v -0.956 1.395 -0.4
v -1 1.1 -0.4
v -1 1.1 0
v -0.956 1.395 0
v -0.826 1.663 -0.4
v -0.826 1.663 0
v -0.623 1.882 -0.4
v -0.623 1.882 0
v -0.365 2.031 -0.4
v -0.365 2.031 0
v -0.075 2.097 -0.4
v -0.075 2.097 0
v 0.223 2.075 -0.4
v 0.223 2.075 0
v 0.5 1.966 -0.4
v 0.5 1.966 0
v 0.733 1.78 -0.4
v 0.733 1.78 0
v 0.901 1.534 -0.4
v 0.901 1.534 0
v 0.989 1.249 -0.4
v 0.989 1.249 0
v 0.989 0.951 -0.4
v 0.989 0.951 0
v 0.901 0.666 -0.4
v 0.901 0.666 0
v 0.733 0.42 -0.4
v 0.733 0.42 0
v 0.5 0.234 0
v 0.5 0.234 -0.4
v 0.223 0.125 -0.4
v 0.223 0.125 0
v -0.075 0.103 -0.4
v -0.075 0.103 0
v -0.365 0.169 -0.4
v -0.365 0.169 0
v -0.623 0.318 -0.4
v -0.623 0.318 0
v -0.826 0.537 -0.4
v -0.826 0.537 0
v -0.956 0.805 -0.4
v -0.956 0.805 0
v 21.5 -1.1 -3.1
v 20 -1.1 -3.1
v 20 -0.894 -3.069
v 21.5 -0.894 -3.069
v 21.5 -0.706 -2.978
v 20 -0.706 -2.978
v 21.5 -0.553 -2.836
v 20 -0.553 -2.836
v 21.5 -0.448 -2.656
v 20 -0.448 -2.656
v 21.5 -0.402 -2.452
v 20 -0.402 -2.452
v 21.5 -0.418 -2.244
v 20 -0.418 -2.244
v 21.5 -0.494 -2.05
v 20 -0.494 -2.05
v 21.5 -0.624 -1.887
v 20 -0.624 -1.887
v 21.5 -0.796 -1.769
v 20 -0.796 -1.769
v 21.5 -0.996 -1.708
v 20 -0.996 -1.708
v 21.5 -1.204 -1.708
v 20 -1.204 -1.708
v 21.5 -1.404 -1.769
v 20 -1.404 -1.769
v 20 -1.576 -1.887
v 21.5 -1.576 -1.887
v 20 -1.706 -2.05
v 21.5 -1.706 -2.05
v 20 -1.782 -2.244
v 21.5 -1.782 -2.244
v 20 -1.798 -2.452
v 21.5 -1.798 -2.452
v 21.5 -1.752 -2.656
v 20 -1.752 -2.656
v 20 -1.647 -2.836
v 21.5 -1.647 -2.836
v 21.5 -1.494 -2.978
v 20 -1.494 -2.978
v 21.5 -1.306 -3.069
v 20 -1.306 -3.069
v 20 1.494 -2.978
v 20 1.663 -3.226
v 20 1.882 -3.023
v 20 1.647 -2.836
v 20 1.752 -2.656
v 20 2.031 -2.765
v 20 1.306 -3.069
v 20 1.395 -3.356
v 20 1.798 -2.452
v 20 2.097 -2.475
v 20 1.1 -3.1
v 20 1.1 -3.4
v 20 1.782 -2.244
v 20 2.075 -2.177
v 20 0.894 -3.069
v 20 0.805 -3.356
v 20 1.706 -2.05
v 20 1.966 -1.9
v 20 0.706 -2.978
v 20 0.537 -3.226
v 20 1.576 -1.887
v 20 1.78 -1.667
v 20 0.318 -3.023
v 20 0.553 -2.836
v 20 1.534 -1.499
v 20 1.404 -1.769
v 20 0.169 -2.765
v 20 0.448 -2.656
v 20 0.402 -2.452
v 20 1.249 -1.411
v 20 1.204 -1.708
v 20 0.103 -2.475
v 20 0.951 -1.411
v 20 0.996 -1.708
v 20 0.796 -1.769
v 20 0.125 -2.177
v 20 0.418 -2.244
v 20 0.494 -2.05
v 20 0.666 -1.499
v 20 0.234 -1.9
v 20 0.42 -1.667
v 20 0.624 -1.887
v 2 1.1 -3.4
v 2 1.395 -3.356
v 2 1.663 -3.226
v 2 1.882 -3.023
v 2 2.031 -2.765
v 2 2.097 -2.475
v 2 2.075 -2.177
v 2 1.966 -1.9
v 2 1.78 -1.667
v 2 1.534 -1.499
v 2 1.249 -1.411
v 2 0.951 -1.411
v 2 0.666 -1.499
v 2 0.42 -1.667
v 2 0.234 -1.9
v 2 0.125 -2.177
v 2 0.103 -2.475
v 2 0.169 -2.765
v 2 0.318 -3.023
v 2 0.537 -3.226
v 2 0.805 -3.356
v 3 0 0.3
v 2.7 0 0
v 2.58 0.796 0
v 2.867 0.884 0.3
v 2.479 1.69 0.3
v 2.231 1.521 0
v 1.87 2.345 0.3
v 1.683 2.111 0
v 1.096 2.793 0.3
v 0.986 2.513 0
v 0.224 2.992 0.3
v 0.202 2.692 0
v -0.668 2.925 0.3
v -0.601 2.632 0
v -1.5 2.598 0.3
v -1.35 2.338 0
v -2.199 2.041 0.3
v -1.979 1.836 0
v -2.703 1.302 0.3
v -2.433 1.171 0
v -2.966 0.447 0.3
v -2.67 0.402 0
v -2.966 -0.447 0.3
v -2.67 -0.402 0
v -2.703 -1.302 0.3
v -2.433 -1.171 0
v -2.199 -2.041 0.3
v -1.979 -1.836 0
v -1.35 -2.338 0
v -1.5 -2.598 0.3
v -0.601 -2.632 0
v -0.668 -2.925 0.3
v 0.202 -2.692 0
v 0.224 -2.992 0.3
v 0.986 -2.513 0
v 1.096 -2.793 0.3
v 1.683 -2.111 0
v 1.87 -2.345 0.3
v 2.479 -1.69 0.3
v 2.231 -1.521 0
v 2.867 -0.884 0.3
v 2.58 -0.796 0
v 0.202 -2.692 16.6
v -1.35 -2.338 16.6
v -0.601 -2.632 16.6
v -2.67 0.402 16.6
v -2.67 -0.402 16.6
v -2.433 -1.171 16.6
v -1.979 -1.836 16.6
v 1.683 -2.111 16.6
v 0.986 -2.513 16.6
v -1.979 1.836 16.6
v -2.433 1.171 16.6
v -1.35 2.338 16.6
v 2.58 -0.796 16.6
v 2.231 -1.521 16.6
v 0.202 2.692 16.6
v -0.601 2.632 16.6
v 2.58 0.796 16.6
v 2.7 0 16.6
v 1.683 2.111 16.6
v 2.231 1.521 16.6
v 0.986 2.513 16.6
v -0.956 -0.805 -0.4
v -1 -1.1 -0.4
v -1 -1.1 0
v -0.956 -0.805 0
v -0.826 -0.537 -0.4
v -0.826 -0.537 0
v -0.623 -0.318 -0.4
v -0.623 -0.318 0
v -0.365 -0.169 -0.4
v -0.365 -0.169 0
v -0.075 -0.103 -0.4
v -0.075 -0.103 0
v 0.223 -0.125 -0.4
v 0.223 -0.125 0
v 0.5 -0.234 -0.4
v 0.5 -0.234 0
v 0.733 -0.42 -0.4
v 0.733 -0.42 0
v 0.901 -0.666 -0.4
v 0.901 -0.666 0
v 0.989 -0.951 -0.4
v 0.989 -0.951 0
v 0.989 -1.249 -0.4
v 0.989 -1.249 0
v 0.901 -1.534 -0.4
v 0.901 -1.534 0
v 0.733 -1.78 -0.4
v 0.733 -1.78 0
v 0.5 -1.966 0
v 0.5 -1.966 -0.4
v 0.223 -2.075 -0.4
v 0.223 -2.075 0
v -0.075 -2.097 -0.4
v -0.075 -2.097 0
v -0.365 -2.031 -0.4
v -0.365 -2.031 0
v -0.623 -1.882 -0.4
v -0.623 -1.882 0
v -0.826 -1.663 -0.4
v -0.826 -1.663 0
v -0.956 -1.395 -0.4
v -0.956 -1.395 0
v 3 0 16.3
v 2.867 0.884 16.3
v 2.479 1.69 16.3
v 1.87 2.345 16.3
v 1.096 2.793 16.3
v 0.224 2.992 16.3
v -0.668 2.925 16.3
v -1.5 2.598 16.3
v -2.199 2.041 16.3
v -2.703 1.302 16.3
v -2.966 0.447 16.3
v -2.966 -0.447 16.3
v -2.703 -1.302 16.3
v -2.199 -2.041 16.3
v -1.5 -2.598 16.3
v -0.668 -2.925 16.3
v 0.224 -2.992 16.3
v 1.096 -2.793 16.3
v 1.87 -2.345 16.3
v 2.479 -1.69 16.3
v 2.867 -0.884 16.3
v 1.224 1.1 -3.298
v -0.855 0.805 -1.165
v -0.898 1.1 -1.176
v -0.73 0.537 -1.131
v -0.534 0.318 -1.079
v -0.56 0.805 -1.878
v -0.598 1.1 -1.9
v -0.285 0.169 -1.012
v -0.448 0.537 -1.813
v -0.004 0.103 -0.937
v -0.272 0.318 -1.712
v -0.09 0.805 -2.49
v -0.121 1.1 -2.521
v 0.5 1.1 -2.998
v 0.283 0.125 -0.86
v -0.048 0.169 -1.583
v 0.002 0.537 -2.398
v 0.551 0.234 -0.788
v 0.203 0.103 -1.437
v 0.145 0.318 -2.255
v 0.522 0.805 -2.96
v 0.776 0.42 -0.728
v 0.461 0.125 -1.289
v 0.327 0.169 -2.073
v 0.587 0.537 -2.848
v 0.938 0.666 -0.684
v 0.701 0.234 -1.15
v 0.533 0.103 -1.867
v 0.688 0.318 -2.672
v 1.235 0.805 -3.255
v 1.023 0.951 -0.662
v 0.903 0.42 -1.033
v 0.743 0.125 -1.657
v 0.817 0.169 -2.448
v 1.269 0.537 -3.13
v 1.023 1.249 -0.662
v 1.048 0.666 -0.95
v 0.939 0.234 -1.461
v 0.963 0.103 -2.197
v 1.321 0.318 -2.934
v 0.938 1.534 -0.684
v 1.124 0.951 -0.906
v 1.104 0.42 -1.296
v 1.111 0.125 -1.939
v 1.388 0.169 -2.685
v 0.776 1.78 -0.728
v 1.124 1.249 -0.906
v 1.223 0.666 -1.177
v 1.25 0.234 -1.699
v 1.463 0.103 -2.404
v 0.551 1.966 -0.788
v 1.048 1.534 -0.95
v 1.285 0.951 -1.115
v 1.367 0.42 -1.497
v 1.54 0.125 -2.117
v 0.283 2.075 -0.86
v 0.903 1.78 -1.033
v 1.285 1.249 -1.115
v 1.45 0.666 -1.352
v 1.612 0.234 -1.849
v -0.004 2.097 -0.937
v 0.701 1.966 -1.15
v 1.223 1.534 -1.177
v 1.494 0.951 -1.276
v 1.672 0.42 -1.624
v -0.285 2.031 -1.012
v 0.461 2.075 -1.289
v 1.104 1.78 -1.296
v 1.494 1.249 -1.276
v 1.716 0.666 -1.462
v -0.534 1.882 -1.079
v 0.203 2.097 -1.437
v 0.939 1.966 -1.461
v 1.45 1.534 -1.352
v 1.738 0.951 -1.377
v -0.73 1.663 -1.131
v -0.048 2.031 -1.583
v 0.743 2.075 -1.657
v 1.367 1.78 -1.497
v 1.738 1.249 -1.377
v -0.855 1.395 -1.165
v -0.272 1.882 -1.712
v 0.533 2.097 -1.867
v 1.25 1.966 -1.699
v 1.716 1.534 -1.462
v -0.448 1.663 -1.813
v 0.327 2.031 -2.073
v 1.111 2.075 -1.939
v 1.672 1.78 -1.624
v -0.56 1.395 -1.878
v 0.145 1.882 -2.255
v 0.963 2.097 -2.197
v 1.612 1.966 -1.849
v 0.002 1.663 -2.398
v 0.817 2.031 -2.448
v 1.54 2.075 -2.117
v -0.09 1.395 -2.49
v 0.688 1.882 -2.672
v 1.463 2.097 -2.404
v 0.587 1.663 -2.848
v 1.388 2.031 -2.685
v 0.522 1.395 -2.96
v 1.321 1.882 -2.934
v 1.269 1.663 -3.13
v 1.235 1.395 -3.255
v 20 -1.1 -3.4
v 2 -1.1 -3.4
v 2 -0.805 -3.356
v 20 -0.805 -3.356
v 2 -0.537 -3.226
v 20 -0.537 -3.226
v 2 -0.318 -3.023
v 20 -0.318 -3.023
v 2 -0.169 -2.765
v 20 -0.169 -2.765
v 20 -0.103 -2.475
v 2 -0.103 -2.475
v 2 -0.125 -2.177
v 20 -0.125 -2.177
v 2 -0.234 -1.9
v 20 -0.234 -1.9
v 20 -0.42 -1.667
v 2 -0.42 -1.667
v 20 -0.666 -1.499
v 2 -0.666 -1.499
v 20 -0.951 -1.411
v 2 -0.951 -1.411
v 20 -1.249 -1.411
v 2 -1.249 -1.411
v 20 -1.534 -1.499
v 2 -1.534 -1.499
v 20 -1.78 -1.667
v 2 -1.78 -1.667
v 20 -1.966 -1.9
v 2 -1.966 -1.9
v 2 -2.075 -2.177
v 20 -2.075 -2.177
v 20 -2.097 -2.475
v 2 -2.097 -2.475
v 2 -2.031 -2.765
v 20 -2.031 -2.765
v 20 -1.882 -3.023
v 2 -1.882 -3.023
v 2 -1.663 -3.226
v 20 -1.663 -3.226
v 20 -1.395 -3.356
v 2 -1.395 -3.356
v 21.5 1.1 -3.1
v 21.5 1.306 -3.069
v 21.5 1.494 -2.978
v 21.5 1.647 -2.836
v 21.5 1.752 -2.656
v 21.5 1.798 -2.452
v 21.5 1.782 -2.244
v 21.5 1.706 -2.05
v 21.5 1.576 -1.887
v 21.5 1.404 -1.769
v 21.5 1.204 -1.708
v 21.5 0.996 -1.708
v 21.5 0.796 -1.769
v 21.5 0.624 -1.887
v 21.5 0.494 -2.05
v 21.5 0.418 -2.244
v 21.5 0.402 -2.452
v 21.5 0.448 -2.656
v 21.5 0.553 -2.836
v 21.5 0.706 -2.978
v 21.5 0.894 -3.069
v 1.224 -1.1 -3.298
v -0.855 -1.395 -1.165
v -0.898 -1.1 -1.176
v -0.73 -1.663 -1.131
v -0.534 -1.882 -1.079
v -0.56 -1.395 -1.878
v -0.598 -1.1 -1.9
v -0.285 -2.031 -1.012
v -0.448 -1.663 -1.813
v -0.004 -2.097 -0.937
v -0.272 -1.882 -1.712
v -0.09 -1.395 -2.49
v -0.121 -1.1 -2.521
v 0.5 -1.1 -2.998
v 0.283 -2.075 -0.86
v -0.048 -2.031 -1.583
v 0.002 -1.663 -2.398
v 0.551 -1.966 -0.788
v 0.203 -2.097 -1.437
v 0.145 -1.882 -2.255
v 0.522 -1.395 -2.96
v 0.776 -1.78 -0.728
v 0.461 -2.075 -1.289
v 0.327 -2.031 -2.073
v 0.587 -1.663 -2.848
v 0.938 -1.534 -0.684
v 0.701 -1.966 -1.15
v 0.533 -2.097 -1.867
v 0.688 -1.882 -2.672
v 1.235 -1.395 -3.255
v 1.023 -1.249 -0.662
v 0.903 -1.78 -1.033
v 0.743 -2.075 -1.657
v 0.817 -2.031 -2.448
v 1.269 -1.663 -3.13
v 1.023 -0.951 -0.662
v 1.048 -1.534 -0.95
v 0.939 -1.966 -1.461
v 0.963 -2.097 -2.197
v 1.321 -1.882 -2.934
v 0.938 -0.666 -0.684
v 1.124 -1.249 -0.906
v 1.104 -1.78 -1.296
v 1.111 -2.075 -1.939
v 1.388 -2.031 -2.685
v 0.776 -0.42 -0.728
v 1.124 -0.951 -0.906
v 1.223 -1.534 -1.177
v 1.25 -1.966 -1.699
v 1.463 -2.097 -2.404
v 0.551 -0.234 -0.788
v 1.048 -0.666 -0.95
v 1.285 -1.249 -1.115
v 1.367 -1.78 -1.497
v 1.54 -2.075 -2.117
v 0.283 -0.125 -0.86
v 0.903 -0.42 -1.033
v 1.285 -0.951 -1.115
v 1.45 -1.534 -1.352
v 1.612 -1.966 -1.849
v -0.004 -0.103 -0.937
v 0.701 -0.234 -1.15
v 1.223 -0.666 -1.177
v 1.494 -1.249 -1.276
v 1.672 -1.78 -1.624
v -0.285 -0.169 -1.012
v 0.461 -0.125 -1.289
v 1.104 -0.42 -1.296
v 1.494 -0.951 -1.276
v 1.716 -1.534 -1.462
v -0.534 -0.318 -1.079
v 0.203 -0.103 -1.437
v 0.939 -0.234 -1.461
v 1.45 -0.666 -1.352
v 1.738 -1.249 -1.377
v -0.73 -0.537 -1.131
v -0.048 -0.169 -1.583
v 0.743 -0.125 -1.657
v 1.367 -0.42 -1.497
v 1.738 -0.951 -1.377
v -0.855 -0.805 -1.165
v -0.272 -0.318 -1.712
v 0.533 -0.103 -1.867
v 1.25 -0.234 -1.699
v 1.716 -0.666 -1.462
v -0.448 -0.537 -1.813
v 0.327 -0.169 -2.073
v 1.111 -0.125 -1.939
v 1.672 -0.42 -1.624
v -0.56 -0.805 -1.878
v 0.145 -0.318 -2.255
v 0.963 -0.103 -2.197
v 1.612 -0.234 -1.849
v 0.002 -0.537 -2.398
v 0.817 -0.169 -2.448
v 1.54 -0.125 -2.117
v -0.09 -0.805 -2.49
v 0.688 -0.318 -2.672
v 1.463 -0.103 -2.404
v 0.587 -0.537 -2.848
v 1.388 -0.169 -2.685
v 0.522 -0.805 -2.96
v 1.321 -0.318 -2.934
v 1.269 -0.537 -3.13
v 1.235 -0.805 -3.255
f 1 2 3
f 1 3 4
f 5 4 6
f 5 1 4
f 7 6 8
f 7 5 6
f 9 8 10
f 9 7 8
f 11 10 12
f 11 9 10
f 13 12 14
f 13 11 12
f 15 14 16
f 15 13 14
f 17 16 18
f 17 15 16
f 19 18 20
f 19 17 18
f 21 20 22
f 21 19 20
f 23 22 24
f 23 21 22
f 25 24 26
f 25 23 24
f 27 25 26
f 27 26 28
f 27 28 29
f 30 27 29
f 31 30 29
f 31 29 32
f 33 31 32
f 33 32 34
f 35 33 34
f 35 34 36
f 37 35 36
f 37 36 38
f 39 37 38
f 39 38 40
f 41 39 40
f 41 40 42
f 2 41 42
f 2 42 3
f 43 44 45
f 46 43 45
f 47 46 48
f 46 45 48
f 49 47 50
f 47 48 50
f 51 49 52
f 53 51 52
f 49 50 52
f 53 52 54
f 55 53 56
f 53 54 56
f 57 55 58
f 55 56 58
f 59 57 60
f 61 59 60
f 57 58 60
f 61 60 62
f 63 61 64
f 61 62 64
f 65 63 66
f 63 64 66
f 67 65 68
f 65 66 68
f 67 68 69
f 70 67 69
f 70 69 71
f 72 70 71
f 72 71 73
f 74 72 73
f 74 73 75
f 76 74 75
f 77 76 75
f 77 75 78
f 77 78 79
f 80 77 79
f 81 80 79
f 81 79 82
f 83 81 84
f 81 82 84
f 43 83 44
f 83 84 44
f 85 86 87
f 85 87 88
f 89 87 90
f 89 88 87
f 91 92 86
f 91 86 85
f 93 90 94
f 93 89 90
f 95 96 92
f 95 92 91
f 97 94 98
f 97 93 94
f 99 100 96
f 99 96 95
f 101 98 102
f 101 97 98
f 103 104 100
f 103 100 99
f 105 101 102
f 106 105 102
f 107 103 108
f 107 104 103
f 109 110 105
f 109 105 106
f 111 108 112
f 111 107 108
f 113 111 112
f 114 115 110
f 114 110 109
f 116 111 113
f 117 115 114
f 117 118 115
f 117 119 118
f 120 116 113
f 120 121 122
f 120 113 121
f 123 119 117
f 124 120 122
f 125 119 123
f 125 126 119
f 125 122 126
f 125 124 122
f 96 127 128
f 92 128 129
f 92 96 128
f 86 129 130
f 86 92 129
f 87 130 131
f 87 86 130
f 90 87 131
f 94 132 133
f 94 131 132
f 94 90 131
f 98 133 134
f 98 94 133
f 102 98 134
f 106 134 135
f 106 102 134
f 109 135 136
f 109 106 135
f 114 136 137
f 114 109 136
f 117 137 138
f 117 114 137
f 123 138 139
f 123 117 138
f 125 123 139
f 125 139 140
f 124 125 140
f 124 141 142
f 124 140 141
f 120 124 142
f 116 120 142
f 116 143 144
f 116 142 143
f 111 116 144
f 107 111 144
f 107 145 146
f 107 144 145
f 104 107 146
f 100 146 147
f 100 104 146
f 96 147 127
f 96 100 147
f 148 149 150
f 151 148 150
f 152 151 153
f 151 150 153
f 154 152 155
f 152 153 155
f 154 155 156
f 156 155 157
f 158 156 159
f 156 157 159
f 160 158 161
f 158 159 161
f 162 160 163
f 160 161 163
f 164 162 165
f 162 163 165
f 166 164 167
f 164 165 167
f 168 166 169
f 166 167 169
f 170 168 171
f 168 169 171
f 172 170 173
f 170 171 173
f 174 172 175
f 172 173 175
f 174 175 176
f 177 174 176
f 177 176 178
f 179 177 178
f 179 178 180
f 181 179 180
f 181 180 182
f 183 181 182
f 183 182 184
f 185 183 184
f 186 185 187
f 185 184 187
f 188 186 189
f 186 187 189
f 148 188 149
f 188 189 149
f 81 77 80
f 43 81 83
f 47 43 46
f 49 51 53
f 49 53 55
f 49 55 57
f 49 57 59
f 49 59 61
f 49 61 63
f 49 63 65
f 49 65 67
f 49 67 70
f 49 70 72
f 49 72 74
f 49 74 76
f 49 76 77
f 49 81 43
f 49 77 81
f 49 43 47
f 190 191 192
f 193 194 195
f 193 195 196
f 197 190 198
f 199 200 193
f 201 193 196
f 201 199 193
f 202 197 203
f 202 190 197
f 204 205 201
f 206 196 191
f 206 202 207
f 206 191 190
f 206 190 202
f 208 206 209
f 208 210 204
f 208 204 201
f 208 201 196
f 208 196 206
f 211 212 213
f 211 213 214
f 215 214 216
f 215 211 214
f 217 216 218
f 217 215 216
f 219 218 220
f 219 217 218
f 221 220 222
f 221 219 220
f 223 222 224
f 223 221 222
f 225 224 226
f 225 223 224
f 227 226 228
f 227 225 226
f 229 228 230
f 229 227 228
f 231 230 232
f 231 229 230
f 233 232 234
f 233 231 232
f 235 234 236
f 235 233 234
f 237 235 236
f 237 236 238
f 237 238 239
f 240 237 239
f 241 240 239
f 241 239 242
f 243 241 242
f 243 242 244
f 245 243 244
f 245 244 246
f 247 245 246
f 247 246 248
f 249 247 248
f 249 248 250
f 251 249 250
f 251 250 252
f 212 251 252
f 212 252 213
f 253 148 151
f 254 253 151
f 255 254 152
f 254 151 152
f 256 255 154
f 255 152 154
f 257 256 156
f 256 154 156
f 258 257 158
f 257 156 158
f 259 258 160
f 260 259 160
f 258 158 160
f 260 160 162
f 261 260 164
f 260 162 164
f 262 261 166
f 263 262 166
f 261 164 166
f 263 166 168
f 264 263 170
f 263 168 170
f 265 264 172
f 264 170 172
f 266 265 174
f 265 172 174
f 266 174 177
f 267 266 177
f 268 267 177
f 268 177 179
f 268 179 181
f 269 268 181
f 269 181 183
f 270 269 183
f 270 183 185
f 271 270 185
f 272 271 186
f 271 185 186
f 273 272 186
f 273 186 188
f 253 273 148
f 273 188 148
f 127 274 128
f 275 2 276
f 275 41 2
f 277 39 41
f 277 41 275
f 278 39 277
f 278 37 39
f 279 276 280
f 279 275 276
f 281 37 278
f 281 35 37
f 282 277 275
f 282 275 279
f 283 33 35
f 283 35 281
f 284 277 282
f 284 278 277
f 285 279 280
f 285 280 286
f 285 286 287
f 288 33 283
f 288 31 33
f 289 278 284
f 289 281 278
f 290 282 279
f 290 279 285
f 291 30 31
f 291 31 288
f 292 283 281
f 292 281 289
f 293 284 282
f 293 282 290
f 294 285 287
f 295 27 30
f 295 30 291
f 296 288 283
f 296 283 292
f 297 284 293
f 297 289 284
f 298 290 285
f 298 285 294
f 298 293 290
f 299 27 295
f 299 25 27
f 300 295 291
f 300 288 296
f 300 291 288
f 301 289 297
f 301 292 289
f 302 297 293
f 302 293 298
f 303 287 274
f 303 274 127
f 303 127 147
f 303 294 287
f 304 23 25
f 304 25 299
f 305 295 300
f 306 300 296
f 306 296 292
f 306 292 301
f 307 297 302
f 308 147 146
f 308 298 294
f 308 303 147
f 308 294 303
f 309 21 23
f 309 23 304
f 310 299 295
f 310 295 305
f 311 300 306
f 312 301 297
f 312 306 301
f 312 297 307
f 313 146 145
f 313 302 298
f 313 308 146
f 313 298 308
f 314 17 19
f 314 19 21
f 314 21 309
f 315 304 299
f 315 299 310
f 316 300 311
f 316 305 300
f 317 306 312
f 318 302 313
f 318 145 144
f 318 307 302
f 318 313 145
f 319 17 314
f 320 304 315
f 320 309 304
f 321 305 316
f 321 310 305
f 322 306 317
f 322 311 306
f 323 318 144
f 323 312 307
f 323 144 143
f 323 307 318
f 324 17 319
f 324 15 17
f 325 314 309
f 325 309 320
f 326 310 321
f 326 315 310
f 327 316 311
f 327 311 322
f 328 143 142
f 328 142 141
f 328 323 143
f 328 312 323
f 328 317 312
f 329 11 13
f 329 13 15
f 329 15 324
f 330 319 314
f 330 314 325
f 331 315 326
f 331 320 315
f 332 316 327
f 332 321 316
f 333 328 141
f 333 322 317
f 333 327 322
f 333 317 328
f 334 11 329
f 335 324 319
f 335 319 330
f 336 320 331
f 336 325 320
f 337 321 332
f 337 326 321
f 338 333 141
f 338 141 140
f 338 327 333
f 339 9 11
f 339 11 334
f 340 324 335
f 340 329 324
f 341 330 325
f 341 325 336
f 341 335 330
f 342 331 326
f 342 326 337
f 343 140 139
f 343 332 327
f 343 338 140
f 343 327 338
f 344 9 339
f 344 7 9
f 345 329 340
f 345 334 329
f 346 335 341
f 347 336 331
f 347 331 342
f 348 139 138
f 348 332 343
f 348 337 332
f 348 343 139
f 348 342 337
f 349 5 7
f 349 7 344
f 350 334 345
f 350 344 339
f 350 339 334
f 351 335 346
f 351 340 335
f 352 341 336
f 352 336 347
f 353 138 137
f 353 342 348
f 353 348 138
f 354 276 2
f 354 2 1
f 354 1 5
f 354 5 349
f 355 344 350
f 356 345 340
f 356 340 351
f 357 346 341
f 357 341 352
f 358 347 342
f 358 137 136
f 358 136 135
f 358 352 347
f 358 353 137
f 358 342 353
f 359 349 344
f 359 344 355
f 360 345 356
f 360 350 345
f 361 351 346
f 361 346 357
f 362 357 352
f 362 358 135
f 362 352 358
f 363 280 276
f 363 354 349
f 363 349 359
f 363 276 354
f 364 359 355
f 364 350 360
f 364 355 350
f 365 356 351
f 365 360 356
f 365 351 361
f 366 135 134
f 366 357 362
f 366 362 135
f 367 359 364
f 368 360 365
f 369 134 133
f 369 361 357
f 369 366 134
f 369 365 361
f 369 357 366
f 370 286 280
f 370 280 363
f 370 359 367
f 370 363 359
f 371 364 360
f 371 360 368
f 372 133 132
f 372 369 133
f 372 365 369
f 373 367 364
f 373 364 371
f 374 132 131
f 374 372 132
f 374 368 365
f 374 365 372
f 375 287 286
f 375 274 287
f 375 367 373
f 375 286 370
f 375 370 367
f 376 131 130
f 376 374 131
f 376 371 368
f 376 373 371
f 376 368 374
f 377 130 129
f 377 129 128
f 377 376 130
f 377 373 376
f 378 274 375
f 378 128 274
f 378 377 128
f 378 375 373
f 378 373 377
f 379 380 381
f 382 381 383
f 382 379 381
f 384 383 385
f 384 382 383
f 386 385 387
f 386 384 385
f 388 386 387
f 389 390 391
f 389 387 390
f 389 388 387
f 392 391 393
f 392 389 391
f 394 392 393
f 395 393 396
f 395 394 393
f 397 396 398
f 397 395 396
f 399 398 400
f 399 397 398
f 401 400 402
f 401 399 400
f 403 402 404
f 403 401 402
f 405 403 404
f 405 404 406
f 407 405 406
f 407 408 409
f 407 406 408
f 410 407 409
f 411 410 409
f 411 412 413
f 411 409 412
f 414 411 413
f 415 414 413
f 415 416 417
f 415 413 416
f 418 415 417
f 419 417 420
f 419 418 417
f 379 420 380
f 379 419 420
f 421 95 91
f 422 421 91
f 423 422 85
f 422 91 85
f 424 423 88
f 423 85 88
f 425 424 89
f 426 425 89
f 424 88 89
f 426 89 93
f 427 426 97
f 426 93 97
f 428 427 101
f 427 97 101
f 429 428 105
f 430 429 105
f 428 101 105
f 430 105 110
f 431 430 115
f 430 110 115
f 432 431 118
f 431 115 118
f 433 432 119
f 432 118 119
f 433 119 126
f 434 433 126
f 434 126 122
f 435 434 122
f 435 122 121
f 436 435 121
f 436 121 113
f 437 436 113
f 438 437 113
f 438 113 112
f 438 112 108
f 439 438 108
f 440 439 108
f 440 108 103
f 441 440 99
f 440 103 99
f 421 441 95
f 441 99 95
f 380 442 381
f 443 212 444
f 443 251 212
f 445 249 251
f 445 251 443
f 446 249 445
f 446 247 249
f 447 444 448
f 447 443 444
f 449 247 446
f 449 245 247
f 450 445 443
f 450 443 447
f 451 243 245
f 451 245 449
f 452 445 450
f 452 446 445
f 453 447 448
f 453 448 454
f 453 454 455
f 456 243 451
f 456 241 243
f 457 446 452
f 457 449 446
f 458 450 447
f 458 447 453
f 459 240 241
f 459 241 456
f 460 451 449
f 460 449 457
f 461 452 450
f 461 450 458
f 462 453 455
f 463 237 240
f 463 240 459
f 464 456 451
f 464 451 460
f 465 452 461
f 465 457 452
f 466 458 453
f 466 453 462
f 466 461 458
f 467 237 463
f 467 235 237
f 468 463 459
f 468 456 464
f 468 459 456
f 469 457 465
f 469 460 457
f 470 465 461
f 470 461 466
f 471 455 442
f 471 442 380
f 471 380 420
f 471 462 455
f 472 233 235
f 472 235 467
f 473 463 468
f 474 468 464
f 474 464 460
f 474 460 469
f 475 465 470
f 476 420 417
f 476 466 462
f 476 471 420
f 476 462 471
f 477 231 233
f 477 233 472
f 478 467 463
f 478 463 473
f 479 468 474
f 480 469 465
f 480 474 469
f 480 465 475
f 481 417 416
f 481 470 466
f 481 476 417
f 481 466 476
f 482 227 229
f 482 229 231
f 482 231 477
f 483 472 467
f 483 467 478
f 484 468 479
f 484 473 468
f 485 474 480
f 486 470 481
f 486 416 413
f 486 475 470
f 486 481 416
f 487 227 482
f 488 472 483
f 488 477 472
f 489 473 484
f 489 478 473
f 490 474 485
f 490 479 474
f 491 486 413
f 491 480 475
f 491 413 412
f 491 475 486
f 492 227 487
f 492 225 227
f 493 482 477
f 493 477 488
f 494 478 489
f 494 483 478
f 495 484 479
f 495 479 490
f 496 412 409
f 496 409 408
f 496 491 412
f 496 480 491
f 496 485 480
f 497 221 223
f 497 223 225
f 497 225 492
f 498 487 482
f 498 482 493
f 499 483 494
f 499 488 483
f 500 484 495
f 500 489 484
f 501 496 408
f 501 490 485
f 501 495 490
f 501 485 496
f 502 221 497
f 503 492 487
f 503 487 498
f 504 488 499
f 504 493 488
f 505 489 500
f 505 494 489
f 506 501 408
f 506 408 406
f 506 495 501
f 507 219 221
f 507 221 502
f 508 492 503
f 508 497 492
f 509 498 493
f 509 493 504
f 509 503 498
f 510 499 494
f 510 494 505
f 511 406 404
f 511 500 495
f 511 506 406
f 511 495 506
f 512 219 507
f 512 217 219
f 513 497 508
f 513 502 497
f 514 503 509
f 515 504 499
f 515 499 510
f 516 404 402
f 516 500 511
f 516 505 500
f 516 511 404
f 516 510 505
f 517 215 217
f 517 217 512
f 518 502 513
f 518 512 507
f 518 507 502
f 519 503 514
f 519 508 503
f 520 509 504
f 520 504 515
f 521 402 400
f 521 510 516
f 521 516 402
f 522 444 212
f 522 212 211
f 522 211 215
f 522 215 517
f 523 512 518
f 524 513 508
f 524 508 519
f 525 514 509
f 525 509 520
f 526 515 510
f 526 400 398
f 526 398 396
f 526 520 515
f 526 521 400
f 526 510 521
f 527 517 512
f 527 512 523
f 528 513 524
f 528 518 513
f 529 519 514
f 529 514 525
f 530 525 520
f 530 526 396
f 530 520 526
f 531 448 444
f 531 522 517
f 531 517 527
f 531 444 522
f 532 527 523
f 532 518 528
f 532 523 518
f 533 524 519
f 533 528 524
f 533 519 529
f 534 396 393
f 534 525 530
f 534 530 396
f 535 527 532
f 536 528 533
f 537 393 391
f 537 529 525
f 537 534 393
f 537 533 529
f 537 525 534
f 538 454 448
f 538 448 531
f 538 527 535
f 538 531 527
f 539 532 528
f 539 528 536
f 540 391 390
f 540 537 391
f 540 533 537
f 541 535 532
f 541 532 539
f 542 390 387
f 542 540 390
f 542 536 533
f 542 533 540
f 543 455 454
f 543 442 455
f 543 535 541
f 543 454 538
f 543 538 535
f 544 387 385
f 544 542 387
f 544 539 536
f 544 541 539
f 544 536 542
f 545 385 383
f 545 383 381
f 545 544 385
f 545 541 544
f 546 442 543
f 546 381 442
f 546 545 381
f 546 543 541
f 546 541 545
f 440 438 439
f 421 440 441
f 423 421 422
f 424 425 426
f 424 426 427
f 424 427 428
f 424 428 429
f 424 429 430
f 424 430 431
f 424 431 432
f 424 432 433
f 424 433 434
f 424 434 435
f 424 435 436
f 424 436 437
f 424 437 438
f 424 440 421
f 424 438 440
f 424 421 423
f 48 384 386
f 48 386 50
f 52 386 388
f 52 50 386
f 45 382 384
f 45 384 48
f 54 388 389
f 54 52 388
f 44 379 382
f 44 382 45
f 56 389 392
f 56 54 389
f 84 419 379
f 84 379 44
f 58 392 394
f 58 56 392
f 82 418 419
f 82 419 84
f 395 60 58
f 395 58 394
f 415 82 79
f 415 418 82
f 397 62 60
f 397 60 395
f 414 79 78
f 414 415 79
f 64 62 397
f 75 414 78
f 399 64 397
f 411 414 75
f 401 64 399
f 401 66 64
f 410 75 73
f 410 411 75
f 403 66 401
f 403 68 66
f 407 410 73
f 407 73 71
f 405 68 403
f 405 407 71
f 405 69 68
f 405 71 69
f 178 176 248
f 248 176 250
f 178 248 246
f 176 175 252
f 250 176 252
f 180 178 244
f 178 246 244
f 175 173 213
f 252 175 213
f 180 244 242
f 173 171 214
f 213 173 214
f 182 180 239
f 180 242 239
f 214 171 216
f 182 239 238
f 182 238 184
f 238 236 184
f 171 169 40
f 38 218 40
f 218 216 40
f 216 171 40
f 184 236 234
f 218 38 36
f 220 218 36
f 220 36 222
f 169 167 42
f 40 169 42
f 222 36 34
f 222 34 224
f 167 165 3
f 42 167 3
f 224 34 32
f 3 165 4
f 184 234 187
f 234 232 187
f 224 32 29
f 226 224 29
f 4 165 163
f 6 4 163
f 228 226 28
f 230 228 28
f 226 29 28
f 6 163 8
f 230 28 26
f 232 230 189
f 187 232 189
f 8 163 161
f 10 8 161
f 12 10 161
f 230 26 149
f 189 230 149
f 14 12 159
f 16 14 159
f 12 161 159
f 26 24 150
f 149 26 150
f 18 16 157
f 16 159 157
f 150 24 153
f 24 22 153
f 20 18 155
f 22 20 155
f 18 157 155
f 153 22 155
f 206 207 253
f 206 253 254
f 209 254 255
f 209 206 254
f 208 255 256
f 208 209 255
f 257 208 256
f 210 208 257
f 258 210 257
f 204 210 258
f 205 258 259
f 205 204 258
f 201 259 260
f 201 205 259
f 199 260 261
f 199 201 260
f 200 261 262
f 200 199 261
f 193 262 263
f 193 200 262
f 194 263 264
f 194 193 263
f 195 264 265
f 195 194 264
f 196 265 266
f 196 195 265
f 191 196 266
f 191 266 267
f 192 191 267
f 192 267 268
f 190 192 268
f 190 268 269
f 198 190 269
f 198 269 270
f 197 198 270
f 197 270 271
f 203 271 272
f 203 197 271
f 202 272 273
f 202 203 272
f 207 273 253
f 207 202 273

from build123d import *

# Parameters (mm, degrees)
SKETCH1_R           = 3
CASING_DEPTH        = 16.6
CASING_CHAMFER_SIZE = 0.3
SKETCH3_R           = 1
SKETCH4_R           = 0.7
EXPOSED_WIRE_DEPTH  = 1.5


with BuildPart() as part:
    # Sketch1 → Casing (new body)
    with BuildSketch(Plane.XY):
        Circle(SKETCH1_R)
    extrude(amount=CASING_DEPTH)

    # Casing Chamfer
    casing_chamfer_edges = [part.edges().sort_by_distance(p)[0] for p in [
        (-3, 0, 0),
        (-3, 0, 16.6),
    ]]
    chamfer(casing_chamfer_edges, length=CASING_CHAMFER_SIZE)

    # Wire 2: sweep along a path in Sketch2
    with BuildLine(Plane(origin=(0, 0, 0), x_dir=(1, 0, 0), z_dir=(0, 1, 0))) as wire_2_path:
        Line((0, 0), (0, 0.4))
        ThreePointArc((0, 0.4), (0.585786438, 1.814213562), (2, 2.4))
        Line((2, 2.4), (20, 2.4))
    # Sketch3 → Wire 2 (sweep)
    with BuildSketch(Plane(origin=(0, 0, 0), x_dir=(-1, 0, 0), z_dir=(0, 0, -1))):
        with Locations((0, -1.1)):
            Circle(SKETCH3_R)
        with Locations((0, 1.1)):
            Circle(SKETCH3_R)
    sweep(path=wire_2_path.line)

    # Sketch4 → Exposed Wire (add)
    with BuildSketch(Plane(origin=(20, 0, 0), x_dir=(0, 0, -1), z_dir=(1, 0, 0))):
        with Locations((2.4, 1.1)):
            Circle(SKETCH4_R)
        with Locations((2.4, -1.1)):
            Circle(SKETCH4_R)
    extrude(amount=EXPOSED_WIRE_DEPTH)


solid = part.part
